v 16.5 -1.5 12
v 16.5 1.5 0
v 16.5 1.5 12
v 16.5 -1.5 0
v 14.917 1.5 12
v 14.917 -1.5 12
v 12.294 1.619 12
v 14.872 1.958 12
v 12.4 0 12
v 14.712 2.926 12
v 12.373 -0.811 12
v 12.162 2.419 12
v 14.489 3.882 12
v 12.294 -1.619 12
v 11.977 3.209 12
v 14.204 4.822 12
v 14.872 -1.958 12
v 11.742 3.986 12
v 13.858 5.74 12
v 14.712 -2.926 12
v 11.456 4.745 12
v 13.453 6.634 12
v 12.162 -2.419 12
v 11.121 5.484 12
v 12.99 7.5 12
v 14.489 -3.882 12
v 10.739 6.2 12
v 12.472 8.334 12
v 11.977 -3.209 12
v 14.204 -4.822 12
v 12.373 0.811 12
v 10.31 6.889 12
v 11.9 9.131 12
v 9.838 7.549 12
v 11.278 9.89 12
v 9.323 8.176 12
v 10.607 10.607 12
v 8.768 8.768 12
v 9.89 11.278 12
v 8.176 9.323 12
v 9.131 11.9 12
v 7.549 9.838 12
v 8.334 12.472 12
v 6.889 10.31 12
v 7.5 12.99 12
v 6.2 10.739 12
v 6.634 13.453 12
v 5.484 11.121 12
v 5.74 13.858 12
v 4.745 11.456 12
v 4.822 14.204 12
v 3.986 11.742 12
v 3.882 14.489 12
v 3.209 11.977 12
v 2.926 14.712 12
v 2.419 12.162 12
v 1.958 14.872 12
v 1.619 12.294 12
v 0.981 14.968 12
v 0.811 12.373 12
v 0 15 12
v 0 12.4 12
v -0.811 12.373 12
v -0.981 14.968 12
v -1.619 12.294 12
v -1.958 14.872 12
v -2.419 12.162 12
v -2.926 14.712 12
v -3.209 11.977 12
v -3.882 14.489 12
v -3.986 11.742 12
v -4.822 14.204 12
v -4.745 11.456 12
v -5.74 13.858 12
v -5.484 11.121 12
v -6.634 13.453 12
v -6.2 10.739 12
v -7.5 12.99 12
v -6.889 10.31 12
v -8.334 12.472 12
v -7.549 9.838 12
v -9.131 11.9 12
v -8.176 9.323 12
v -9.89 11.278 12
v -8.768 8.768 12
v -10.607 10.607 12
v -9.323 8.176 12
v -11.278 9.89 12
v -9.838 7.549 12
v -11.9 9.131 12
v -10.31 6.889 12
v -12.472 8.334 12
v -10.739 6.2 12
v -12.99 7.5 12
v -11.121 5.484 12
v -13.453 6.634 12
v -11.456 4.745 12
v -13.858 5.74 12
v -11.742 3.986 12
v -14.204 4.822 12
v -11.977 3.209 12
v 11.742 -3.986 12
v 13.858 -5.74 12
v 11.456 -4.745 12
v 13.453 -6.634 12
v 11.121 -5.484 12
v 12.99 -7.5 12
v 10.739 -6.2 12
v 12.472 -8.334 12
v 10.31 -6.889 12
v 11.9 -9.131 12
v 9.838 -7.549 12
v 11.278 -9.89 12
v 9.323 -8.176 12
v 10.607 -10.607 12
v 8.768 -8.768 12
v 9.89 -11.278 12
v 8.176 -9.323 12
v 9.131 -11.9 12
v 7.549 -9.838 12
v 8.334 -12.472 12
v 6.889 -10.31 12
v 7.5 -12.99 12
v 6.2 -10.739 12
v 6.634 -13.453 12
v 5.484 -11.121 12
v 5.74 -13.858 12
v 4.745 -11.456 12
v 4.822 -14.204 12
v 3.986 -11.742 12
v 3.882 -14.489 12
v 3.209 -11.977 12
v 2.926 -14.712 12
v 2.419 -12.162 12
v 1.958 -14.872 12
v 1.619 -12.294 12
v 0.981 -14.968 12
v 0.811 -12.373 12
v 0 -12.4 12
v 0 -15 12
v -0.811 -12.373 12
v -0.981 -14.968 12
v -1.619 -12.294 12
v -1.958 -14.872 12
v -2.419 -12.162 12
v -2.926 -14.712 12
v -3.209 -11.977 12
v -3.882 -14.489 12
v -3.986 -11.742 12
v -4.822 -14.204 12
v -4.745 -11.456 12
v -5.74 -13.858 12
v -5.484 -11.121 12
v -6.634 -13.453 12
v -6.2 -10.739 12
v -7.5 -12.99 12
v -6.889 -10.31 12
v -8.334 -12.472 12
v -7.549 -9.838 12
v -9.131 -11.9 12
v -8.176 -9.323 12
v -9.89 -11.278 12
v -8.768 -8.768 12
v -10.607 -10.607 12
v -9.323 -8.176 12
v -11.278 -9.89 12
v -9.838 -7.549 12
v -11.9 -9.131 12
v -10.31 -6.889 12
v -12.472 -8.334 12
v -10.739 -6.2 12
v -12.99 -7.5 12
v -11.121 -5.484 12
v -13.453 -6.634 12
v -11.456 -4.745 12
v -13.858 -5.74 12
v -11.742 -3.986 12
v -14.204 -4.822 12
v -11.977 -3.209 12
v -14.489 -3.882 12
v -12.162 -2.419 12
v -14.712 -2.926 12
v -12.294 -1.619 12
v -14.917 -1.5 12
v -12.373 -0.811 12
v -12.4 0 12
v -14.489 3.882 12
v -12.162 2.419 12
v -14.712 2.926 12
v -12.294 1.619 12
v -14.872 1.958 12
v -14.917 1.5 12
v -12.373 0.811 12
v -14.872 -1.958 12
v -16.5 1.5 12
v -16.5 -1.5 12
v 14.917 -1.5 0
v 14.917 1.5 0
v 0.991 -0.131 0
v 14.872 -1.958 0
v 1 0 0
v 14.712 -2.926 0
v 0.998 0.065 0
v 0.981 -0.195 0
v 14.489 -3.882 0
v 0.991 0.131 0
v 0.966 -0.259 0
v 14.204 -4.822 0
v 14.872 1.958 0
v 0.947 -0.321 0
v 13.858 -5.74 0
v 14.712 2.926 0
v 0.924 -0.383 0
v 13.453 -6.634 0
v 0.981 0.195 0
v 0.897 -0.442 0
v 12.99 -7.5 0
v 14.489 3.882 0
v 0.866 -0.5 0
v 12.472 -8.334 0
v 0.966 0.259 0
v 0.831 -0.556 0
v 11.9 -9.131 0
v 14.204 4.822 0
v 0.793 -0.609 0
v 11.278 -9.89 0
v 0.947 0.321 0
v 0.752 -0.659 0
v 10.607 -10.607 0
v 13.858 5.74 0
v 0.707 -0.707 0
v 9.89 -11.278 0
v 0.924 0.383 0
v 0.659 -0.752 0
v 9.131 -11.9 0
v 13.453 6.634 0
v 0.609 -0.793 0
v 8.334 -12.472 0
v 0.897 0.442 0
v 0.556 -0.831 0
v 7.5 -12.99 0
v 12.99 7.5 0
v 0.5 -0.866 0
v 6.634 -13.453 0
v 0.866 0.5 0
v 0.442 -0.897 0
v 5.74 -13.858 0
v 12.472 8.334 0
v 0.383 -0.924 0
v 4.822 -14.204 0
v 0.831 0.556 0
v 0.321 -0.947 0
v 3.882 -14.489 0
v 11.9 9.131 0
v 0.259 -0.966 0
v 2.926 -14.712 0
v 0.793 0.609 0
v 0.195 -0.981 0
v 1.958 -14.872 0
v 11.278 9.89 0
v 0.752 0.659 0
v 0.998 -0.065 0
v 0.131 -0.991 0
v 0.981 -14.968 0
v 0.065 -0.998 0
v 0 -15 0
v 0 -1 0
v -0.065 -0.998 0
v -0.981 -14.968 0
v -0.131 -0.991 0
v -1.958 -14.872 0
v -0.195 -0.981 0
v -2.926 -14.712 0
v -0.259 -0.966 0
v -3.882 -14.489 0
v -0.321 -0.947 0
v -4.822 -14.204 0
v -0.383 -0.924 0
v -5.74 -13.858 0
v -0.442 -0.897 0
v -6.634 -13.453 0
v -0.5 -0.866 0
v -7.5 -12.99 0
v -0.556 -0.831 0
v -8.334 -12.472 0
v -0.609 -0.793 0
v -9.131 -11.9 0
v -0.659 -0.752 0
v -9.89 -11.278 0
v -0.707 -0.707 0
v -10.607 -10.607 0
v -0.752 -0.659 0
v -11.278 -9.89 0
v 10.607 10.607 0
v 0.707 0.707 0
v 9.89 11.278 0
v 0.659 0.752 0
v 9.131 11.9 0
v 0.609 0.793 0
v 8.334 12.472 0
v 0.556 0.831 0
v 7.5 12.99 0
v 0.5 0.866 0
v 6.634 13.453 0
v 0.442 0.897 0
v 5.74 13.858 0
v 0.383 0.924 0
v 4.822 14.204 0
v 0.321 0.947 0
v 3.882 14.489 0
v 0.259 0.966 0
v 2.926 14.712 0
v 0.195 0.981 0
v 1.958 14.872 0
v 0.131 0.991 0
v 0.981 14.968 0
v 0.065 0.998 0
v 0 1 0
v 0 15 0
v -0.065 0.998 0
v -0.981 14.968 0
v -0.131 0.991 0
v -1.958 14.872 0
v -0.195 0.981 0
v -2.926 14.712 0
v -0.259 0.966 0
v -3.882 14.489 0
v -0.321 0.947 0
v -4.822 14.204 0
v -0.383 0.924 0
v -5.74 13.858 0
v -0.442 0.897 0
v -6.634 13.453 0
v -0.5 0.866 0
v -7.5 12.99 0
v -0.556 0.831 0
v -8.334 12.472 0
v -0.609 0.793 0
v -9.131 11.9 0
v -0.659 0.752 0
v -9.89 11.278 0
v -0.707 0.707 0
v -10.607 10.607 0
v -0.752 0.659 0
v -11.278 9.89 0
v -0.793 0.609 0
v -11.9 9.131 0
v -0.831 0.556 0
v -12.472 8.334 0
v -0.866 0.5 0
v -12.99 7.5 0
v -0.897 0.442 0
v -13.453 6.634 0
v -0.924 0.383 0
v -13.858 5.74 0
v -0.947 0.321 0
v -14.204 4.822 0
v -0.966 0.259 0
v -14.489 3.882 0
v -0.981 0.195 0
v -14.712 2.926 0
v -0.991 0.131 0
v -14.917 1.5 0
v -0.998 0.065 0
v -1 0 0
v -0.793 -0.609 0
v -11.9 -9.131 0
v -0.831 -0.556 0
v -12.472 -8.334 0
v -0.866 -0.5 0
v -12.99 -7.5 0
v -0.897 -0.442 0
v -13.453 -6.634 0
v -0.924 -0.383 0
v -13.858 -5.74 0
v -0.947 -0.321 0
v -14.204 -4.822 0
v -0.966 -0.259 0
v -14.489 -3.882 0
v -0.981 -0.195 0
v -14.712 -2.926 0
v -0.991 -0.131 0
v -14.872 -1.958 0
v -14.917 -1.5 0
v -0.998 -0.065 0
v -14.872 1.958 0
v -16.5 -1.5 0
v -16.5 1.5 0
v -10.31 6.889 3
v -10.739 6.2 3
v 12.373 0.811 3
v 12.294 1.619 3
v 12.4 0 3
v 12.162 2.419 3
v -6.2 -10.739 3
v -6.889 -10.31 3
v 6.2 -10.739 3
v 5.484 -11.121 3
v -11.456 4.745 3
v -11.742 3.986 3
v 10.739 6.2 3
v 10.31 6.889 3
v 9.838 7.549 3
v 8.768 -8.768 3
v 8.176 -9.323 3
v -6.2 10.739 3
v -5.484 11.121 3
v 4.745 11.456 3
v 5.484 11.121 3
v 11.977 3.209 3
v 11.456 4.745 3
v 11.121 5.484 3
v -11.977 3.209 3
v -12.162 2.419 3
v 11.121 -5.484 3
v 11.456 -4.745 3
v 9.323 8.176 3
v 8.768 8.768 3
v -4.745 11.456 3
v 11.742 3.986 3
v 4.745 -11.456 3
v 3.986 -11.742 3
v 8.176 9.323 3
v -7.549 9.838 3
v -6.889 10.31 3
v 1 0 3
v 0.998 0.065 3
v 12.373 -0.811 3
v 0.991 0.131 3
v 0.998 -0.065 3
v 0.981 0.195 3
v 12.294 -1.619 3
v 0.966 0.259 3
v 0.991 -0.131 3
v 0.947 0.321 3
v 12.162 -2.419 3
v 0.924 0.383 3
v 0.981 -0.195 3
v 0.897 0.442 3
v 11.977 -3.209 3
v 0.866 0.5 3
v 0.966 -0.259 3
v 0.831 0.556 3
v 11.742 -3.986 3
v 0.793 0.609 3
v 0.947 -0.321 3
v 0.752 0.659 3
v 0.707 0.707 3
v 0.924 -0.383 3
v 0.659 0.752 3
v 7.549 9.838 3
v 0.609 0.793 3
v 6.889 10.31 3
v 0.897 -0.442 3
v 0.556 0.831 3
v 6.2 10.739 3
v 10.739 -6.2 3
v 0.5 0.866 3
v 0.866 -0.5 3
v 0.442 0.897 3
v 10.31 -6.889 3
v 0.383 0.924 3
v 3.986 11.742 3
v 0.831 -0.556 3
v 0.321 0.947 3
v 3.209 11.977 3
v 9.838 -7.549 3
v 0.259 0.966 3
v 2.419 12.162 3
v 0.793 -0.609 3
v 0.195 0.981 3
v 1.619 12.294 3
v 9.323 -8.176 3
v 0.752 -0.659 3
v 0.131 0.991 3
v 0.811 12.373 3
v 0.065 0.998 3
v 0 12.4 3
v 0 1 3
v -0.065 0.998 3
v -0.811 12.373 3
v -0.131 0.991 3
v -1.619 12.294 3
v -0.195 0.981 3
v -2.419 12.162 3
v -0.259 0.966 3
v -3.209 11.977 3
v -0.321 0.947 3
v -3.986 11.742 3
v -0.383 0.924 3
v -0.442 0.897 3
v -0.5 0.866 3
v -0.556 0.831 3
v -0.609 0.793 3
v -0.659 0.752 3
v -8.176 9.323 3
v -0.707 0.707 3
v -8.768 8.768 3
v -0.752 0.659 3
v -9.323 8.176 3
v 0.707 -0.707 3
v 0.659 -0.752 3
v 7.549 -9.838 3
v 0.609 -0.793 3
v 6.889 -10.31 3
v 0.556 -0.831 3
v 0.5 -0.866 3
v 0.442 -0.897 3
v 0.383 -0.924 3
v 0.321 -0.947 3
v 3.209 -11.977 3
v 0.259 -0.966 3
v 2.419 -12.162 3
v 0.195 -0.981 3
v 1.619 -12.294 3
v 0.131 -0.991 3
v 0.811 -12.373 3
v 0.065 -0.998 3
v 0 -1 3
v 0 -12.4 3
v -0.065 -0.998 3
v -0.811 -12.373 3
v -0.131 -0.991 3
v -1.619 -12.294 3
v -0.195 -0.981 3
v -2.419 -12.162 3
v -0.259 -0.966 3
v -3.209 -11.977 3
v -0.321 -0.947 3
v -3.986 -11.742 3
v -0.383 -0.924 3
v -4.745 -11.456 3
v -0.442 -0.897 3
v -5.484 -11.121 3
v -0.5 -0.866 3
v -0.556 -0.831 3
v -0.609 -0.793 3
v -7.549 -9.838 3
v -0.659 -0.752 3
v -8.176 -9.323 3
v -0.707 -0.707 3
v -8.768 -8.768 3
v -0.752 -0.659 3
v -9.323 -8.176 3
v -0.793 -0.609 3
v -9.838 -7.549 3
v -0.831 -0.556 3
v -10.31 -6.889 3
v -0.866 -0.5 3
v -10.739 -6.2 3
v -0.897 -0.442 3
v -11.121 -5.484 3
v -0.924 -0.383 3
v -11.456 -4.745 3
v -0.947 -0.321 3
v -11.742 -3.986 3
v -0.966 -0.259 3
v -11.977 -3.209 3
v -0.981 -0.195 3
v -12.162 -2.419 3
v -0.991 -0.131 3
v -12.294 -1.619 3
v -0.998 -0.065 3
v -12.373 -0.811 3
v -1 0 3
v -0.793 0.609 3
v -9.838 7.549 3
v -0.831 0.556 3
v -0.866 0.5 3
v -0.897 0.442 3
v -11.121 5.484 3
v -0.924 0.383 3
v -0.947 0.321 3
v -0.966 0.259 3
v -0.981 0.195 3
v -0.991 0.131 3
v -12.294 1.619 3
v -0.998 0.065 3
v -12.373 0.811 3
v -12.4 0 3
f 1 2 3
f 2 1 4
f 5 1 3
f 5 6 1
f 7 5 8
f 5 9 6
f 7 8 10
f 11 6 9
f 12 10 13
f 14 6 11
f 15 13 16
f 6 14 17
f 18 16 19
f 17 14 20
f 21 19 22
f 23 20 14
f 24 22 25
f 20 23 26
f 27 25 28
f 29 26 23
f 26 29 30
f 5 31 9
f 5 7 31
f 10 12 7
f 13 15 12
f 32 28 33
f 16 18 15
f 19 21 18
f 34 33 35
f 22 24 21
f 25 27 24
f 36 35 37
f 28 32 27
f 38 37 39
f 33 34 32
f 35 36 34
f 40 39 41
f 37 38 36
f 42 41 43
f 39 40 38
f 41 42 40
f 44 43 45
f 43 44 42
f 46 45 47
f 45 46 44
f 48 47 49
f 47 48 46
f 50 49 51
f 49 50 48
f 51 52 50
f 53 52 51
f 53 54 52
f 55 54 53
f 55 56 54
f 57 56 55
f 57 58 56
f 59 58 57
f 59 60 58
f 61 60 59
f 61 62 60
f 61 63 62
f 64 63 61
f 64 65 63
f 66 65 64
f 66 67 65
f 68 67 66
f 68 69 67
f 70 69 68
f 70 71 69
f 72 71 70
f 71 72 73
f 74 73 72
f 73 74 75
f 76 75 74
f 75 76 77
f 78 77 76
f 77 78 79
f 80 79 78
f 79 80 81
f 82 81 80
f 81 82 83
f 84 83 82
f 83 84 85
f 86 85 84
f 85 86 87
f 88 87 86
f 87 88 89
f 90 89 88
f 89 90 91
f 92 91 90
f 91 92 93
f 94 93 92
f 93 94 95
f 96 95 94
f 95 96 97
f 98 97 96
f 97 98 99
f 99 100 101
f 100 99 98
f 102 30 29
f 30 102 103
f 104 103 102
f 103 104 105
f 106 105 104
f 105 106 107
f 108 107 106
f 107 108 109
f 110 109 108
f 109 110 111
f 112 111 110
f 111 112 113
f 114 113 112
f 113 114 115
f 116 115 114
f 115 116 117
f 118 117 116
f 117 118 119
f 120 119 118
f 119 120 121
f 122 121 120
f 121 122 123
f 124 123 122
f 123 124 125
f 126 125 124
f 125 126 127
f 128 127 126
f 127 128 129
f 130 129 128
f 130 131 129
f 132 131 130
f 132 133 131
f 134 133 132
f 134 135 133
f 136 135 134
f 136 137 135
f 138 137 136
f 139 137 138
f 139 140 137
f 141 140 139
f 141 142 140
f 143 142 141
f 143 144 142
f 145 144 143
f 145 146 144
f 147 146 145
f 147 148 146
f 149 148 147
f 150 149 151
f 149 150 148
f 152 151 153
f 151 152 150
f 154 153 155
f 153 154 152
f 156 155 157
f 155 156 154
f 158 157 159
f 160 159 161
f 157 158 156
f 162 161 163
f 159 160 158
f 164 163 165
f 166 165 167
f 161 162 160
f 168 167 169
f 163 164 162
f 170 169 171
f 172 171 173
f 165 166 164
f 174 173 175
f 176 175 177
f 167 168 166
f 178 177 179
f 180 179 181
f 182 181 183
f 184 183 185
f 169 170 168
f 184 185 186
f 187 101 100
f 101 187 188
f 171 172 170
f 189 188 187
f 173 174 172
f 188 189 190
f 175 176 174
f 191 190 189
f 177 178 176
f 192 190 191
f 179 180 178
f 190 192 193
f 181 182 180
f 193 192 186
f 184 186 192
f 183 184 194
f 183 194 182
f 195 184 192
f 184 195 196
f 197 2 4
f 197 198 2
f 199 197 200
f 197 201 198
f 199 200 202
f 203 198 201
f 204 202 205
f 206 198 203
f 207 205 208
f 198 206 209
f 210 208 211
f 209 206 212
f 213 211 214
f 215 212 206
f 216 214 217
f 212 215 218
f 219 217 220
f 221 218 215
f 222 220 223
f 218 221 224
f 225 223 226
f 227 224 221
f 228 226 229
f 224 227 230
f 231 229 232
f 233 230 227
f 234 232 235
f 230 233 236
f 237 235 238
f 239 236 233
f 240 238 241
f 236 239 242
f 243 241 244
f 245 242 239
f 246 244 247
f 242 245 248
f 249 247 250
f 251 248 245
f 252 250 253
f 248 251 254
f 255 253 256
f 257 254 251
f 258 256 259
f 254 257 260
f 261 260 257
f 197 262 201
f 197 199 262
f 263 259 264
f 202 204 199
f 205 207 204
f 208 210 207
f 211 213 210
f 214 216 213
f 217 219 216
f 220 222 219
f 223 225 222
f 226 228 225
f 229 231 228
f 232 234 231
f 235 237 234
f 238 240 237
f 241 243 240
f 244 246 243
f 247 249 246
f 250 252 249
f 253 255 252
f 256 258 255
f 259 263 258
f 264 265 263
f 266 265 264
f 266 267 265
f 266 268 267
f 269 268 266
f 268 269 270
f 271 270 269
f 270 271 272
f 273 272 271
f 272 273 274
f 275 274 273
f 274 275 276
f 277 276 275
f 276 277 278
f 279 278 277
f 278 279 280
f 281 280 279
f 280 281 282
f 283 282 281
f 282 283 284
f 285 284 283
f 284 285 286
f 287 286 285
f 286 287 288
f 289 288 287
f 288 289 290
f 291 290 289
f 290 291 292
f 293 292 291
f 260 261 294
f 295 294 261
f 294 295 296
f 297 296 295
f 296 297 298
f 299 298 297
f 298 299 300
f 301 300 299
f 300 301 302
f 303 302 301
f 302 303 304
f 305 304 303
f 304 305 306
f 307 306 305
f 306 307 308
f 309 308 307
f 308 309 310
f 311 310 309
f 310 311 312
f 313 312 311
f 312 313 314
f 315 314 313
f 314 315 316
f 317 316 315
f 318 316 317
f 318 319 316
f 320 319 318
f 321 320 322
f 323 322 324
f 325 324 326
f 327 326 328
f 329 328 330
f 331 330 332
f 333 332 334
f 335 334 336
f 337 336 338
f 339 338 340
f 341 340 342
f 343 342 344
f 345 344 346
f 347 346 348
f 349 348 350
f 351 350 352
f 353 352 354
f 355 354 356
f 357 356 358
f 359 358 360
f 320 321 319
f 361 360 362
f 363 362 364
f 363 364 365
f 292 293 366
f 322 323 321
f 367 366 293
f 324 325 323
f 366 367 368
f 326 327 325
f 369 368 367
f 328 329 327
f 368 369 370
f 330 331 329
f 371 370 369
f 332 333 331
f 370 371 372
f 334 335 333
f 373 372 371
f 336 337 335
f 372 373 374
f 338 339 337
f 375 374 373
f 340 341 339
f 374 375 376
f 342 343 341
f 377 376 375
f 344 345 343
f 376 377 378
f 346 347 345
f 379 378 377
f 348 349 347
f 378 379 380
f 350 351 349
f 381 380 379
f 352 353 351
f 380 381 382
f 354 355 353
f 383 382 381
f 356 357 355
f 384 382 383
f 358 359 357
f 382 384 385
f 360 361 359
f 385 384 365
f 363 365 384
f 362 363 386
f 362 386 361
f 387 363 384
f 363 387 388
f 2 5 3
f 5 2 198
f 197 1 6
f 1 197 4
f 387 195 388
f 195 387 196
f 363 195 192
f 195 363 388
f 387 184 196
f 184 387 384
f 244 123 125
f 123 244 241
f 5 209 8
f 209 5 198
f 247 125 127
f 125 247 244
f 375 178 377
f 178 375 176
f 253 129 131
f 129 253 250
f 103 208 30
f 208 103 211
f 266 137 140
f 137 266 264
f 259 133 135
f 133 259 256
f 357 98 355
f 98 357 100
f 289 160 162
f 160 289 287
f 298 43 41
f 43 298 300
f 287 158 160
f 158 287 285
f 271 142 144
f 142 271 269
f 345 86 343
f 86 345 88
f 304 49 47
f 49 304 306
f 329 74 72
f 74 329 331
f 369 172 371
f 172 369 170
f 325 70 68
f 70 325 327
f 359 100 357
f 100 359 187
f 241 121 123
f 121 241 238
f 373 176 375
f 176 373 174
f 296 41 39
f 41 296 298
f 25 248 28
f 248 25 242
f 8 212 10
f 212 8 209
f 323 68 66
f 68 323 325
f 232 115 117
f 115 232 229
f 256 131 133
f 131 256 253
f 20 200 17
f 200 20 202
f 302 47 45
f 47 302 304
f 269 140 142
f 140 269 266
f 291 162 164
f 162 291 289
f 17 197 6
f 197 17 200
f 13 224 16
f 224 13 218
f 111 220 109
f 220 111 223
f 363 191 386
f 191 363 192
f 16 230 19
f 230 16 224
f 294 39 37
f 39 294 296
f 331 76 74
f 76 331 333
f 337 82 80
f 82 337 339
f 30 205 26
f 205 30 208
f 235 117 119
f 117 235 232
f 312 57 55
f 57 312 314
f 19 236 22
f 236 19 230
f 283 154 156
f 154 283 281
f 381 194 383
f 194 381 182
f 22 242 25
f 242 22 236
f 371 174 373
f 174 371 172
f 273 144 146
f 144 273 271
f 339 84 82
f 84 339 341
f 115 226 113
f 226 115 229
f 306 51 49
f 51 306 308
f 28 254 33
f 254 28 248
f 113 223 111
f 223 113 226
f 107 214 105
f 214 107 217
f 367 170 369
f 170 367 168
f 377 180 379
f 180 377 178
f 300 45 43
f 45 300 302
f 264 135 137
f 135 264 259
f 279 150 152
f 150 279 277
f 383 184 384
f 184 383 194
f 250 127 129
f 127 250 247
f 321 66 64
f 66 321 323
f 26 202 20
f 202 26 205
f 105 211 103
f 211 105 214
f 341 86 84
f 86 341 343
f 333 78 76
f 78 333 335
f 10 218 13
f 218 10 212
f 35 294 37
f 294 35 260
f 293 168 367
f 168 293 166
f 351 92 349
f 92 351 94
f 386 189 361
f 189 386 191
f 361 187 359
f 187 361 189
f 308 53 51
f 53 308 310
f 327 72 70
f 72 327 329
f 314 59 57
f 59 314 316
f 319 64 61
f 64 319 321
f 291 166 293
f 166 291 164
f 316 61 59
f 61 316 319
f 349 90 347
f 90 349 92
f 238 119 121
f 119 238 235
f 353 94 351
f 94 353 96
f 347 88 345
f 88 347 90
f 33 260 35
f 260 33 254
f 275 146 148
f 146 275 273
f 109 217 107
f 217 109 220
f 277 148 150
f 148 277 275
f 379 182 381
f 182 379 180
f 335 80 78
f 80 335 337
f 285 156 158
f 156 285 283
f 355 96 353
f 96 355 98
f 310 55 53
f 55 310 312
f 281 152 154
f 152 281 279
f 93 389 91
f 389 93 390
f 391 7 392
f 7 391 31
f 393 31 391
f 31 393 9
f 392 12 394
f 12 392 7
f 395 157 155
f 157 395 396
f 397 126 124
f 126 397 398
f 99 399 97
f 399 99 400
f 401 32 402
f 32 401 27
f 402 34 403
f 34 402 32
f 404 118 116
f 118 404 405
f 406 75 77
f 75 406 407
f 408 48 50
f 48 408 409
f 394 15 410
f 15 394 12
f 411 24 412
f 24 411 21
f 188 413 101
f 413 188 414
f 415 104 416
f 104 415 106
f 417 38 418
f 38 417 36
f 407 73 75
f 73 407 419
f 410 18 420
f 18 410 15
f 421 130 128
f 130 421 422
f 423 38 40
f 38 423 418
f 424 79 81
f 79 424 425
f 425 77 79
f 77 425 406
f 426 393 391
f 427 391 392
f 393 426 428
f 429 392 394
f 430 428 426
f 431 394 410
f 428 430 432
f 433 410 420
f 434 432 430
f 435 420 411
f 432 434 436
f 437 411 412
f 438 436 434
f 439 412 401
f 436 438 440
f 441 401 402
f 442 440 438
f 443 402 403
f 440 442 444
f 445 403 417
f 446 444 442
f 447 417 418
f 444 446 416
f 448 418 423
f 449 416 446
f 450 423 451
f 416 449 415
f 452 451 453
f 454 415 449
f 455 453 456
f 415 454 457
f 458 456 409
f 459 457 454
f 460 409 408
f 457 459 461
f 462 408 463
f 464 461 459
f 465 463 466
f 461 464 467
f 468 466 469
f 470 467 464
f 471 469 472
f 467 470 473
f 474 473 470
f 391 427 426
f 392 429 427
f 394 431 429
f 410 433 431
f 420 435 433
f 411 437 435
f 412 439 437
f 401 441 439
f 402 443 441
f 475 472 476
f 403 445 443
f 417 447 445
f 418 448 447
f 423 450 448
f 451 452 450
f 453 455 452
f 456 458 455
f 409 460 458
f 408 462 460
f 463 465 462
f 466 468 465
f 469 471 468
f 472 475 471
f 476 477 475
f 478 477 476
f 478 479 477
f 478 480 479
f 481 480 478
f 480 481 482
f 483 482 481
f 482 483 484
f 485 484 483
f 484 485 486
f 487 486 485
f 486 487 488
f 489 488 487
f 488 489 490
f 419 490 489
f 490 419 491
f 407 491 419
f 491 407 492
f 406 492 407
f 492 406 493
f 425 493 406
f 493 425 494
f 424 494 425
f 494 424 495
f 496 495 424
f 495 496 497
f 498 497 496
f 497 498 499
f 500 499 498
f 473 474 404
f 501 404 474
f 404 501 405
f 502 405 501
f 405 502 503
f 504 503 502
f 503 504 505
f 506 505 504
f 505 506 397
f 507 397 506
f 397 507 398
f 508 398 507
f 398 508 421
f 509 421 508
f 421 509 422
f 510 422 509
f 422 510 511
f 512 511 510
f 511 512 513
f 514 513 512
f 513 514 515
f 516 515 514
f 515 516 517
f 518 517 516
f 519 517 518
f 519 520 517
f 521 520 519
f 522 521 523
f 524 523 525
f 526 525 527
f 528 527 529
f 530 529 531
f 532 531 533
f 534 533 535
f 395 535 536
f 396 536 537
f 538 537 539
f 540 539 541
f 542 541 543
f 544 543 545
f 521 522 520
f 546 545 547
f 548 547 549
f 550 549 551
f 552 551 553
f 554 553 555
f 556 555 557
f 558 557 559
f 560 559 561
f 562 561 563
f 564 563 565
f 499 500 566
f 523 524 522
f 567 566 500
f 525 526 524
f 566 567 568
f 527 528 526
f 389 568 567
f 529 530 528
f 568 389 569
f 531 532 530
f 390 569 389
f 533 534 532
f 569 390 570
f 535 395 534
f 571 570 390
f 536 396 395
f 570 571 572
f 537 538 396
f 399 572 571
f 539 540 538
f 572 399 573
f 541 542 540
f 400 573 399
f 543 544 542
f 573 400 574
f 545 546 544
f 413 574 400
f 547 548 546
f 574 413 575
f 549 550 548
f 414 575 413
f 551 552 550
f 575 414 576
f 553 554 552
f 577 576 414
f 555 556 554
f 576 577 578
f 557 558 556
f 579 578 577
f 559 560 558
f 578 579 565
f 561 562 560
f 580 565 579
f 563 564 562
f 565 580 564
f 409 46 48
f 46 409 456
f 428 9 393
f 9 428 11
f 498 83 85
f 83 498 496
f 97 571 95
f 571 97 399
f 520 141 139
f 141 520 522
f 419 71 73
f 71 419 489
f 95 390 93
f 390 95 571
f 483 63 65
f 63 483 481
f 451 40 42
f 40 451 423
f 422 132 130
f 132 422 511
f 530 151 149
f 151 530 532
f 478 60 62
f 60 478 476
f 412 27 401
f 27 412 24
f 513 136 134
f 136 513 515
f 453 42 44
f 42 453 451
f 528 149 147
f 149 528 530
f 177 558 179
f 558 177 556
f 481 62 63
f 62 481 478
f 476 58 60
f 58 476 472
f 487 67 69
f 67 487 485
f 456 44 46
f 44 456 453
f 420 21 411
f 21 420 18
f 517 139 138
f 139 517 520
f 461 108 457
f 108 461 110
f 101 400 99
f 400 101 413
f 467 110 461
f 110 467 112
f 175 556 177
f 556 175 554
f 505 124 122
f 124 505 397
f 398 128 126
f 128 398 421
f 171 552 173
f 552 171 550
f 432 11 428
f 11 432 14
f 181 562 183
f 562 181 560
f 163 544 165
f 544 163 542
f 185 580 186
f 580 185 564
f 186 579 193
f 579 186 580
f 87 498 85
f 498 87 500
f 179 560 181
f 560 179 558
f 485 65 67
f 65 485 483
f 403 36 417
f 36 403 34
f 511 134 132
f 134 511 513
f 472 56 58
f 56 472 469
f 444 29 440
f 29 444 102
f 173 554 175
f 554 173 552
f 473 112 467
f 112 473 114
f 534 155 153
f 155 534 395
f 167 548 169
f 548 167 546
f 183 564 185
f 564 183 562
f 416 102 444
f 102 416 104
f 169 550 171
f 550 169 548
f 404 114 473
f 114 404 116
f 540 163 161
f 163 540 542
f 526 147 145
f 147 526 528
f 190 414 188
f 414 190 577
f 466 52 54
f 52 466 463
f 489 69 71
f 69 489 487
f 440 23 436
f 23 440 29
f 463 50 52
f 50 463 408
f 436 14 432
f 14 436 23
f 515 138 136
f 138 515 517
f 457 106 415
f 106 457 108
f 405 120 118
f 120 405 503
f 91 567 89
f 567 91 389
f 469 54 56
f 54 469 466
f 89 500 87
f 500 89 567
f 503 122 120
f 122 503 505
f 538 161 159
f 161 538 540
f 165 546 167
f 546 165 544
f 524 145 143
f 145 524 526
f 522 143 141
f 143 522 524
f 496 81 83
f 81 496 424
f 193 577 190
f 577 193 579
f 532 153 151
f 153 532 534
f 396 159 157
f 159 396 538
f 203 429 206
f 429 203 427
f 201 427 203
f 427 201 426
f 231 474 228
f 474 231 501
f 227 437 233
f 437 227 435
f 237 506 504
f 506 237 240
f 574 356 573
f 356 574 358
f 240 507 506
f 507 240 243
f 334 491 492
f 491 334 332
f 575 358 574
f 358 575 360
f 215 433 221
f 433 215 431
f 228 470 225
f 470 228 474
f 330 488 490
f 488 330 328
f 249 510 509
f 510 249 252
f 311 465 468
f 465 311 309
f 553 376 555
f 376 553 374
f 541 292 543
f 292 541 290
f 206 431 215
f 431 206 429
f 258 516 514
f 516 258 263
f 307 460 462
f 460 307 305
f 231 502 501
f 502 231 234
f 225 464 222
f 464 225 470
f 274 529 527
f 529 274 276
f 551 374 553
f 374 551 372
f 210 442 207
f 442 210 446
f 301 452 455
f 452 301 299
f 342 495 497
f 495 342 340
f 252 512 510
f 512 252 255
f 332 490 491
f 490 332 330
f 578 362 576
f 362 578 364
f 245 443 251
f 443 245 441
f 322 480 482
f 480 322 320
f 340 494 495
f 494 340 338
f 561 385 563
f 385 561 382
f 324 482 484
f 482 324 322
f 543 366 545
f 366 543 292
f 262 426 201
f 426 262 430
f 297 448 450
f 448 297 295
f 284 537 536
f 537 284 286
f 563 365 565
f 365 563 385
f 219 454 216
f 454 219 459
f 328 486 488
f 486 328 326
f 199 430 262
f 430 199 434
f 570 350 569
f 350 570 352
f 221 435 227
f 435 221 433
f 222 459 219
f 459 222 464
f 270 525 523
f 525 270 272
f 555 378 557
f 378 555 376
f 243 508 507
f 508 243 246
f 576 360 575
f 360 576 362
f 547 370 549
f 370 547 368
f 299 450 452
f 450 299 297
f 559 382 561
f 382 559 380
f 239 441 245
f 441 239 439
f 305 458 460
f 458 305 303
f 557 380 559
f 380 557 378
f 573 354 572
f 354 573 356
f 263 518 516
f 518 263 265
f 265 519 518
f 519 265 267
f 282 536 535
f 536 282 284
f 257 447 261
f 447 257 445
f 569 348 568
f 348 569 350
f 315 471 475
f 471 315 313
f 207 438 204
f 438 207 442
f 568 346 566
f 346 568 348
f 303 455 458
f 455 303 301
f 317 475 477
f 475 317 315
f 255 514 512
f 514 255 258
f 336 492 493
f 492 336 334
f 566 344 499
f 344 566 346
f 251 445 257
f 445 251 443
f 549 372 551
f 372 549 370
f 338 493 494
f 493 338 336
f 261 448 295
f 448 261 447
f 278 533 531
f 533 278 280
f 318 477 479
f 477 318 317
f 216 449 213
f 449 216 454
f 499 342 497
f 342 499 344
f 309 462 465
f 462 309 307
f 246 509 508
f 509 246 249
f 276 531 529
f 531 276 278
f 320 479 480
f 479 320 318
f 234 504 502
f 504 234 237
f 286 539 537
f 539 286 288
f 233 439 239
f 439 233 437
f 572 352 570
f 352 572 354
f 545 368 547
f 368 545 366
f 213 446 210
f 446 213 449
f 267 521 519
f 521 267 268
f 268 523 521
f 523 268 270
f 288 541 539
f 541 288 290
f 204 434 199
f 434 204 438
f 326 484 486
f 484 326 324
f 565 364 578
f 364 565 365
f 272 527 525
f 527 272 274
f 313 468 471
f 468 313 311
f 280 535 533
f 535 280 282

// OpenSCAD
// file: params.scad
// ============================================================================
//  Smart Grow Topf — zentrale Parameter
//  Alle Maße in mm. Verbindliche Werte: docs/02_architektur-und-geometrie.md
//  Hier aendern, nichts in den Bauteilen hart verdrahten.
// ============================================================================

// ---- Render-Qualitaet -------------------------------------------------------
$fn = 96;          // Zylinder-/Rotationsaufloesung (Druck: 96 genuegt)

// ---- Grundkoerper -----------------------------------------------------------
shell_od    = 140.0;                 // Aussen-Durchmesser Topf
wall        = 3.0;                   // Wandstaerke
shell_or    = shell_od / 2;          // 70.0
shell_ir    = shell_or - wall;       // 67.0  Innen-Durchmesser = 134
total_h     = 278.0;                 // Gesamthoehe ohne Pflanze
floor_t     = 3.0;                   // Bodenstaerke Tank

// ---- Wassertank -------------------------------------------------------------
tank_h      = 82.0;                  // Innenhoehe bis Rostauflage
max_water   = 71.0;                  // max. Wasserstand (1,0 L)

// Einfuellstutzen — Wasser nachfuellen, ohne die obere Schale abzunehmen
fill_ang      = 45.0;   // Neigung der Achse ueber der Horizontalen
fill_z_wall   = 68.0;   // Hoehe der Achse beim Durchtritt durch die Aussenwand (r = shell_or)
fill_bore_d   = 16.0;   // lichte Bohrung des Stutzens
fill_wall     = 4.5;    // Wandstaerke des Stutzens
fill_len      = 18.0;   // Laenge ab der Aussenwand, entlang der Achse gemessen
fill_mouth_d  = 22.0;   // Aufweitung (Trichterlippe) am Mund, 45-Grad-Kegel
fill_cs_len   = 3.0;    // Laenge der Aufweitung entlang der Achse
fill_start    = 10.0;   // wie weit der Stutzenkoerper in die Wand hineinreicht (von r = shell_or nach innen)

// ---- Auflagerost / Trennplatte ---------------------------------------------
grid_t      = 4.0;                   // Dicke
grid_od     = 132.0;                 // Aussen-Durchmesser
grid_or     = grid_od / 2;           // 66.0
grid_z0     = tank_h;                // 82.0
grid_z1     = grid_z0 + grid_t;      // 86.0
grid_hole_d = 4.0;                   // Lochung (haelt Blahton zurueck)
grid_pitch  = 9.0;
grid_rim    = 4.0;                   // ungelochter Rand
ledge_ir    = 60.0;                  // Auflagering innen (Tankseite)
ledge_h     = 3.0;
ledge_z1    = grid_z0;               // 82.0
ledge_z0    = ledge_z1 - ledge_h;    // 79.0

// ---- Luftspalt / Innentopf --------------------------------------------------
air_gap     = 30.0;                  // 86 -> 116 ueber max. Wasserstand
pot_z0      = grid_z1 + air_gap;     // 116.0
pot_h       = 150.0;                 // Erdbehaelterhoehe
pot_od      = 132.0;
pot_or      = pot_od / 2;            // 66.0
pot_wall    = 2.5;
pot_ir      = pot_or - pot_wall;     // 63.5
pot_floor_t = 3.0;
pot_z1      = pot_z0 + pot_h;        // 266.0
foot_h      = air_gap;               // Giessfuesse
n_feet      = 6;
foot_r      = 58.0;                  // Fussradius
foot_w      = 12.0;                  // tangentiale Fussbreite
foot_d      = 8.0;                   // radiale Fusstiefe
drain_hole_d = 4.0;
drain_pitch  = 10.0;
pot_hose_w   = 6.0;                  // Schlauchdurchlass am Rand oben (Breite X)
pot_hose_h   = 6.0;                  // Schlauchdurchlass am Rand oben (Tiefe Z)

// ---- Kragen / Ringauflage ---------------------------------------------------
collar_z0   = pot_z1;                // 266.0
collar_z1   = total_h;               // 278.0
collar_h    = collar_z1 - collar_z0;// 12.0
collar_r    = shell_or + 2.0;        // 72.0 Ausstellungsradius

// LST-Ankerloecher im Kragen (Schnur durchfaedeln, Low-Stress-Training)
lst_rows      = 2;                  // Anzahl Lochreihen
lst_holes     = 24;                 // Loecher je Reihe, gleichmaessig ueber den Umfang
lst_hole_d    = 2.2;                // gezeichnet: gedruckt bleiben davon ca. 2,0 mm
lst_row_z     = [269.5, 274.5];     // Hoehe der Reihen (Kragenmitte)
lst_gap_deg   = 8.0;                // Freihaltung um den Sensorkabel-Ausschnitt (+Y = 90 Grad)
lst_drill_len = 10.0;               // radiale Bohrtiefe (grosszuegig durch die Kragenwand)

// ---- Wulst (Elektronik + Kanaele) -------------------------------------------
wulst_z0      = 90.0;
wulst_h       = 160.0;
wulst_z1      = wulst_z0 + wulst_h;  // 250.0
wulst_w       = 60.0;                // tangential (X)
wulst_d       = 40.0;                // radial, ab Mantel
wulst_y_outer = shell_or + wulst_d;  // 110.0
wulst_cr      = 8.0;                 // Eckradius (vertikal)
wulst_wall    = 6.0;                 // Wandstaerke Wulst
wulst_taper   = 40.0;                // 45-Grad-Bodenfase (stuetztragfrei)

// Innenraum (Elektronikkammer)
wc_x   = 20.0;                       // halbe Breite
wc_y0  = 72.0;                       // innen (hinter der Mantelwand)
wc_y1  = wulst_y_outer + 2.0;        // vorne (durch Deckeloeffnung)
wc_z0  = wulst_z0 + 2.0;             // 92.0
wc_z1  = wulst_z1 - wulst_wall;      // 244.0

// Kanaele
cable_d  = 4.5;                      // Sensorkabel
cable_z  = 246.0;
hose_w   = 6.0;                      // Schlauchkanal
hose_z   = 100.0;
pressure_hole_d = 6.5;               // Druckschlauch nach oben
pressure_x = 14.0;
pressure_y = 98.0;

// Deckel-Verschraubung (Innengewinde-Platzhalter fuer M2.5)
boss_d    = 7.0;
boss_hole_d = 2.4;
boss_x    = 17.0;
boss_z    = [100.0, 234.0];

// Tropfkante Wulstboden
drip_band = 1.6;                     // radiale Ueberlappung
drip_h    = 1.6;
drip_z    = wulst_z0 + wulst_taper - 1.0;  // 129.0

// ---- Bauteil-Footprints (Elektronik) ---------------------------------------
xiao_w   = 21.0;                     // XIAO ESP32-C6
xiao_l   = 17.5;
pcb_l    = 52.0;                     // Eigenbau-PCB
pcb_w    = 42.0;
pcb_t    = 1.6;
batt_l   = 59.0;                     // EFASO 503759
batt_w   = 37.0;
batt_t   = 5.0;
pump_d   = 27.8;                     // Adafruit 3910
pump_l   = 66.8;
pump_mount_d = 3.7;                  // Montagebohrungen
pump_mount_cc = 50.0;                // Lochabstand
usb_w    = 9.5;                      // USB-C Durchbruch
usb_h    = 3.6;
led_d    = 5.0;

// ---- Verteilerring ----------------------------------------------------------
ring_od       = 105.0;               // <= 105
ring_or       = ring_od / 2;         // 52.5
ring_ir       = 38.0;                // innere Oeffnung
ring_h        = 16.0;
ring_wall     = 2.2;
ring_holes    = 10;                  // 8..12
ring_hole_d   = 2.6;
ring_hole_r   = ring_ir + 5.0;       // Bohrkreis (innen/ unten)
ring_barb_len = 7.5;                 // Stutzenlaenge (max. 8, gekuerzt wegen Topfwand)
ring_barb_dir = 90.0;                // Stutzenrichtung: 0=+X, 90=+Y (Richtung Wulst)
ring_barb_od  = 5.6;
ring_barb_id  = 3.8;

// ---- Abdeckung (optional) ---------------------------------------------------
cover_od   = 136.0;
cover_t    = 3.0;
cover_hole = 45.0;

// ---- Kappe fuer den Einfuellstutzen -----------------------------------------
cap_od     = 30.0;                   // Aussen-Durchmesser
cap_h      = 12.0;                   // Hoehe (Drucklage, offene Seite nach oben)
cap_id     = 24.8;                   // Sackloch-Bohrung, Klemmsitz auf Stutzen-Aussenmass 25,0
cap_depth  = 9.0;                    // Tiefe der Sackloch-Bohrung (3,0 mm Deckel bleibt)
cap_vent_d = 2.0;                    // Lueftungsloch im Deckel (Druckausgleich)
cap_rib_w  = 3.0;                    // Rippenbreite (tangential)
cap_rib_t  = 1.5;                    // Rippendicke (radial)

// ---- Segmentierung (Bauraum 220 x 220 x 250) --------------------------------
split_z    = wulst_z0;               // 90.0  Trennebene unten/oben
spigot_h   = 6.0;                    // Steckzapfen
spigot_or  = shell_or - 2.0;         // 68.0
socket_ir  = spigot_or + 0.6;        // 68.6 Einsteck-Spiel
// main file
// Kappe fuer den Einfuellstutzen — Druckteil
include <modules.scad>
fill_cap();
